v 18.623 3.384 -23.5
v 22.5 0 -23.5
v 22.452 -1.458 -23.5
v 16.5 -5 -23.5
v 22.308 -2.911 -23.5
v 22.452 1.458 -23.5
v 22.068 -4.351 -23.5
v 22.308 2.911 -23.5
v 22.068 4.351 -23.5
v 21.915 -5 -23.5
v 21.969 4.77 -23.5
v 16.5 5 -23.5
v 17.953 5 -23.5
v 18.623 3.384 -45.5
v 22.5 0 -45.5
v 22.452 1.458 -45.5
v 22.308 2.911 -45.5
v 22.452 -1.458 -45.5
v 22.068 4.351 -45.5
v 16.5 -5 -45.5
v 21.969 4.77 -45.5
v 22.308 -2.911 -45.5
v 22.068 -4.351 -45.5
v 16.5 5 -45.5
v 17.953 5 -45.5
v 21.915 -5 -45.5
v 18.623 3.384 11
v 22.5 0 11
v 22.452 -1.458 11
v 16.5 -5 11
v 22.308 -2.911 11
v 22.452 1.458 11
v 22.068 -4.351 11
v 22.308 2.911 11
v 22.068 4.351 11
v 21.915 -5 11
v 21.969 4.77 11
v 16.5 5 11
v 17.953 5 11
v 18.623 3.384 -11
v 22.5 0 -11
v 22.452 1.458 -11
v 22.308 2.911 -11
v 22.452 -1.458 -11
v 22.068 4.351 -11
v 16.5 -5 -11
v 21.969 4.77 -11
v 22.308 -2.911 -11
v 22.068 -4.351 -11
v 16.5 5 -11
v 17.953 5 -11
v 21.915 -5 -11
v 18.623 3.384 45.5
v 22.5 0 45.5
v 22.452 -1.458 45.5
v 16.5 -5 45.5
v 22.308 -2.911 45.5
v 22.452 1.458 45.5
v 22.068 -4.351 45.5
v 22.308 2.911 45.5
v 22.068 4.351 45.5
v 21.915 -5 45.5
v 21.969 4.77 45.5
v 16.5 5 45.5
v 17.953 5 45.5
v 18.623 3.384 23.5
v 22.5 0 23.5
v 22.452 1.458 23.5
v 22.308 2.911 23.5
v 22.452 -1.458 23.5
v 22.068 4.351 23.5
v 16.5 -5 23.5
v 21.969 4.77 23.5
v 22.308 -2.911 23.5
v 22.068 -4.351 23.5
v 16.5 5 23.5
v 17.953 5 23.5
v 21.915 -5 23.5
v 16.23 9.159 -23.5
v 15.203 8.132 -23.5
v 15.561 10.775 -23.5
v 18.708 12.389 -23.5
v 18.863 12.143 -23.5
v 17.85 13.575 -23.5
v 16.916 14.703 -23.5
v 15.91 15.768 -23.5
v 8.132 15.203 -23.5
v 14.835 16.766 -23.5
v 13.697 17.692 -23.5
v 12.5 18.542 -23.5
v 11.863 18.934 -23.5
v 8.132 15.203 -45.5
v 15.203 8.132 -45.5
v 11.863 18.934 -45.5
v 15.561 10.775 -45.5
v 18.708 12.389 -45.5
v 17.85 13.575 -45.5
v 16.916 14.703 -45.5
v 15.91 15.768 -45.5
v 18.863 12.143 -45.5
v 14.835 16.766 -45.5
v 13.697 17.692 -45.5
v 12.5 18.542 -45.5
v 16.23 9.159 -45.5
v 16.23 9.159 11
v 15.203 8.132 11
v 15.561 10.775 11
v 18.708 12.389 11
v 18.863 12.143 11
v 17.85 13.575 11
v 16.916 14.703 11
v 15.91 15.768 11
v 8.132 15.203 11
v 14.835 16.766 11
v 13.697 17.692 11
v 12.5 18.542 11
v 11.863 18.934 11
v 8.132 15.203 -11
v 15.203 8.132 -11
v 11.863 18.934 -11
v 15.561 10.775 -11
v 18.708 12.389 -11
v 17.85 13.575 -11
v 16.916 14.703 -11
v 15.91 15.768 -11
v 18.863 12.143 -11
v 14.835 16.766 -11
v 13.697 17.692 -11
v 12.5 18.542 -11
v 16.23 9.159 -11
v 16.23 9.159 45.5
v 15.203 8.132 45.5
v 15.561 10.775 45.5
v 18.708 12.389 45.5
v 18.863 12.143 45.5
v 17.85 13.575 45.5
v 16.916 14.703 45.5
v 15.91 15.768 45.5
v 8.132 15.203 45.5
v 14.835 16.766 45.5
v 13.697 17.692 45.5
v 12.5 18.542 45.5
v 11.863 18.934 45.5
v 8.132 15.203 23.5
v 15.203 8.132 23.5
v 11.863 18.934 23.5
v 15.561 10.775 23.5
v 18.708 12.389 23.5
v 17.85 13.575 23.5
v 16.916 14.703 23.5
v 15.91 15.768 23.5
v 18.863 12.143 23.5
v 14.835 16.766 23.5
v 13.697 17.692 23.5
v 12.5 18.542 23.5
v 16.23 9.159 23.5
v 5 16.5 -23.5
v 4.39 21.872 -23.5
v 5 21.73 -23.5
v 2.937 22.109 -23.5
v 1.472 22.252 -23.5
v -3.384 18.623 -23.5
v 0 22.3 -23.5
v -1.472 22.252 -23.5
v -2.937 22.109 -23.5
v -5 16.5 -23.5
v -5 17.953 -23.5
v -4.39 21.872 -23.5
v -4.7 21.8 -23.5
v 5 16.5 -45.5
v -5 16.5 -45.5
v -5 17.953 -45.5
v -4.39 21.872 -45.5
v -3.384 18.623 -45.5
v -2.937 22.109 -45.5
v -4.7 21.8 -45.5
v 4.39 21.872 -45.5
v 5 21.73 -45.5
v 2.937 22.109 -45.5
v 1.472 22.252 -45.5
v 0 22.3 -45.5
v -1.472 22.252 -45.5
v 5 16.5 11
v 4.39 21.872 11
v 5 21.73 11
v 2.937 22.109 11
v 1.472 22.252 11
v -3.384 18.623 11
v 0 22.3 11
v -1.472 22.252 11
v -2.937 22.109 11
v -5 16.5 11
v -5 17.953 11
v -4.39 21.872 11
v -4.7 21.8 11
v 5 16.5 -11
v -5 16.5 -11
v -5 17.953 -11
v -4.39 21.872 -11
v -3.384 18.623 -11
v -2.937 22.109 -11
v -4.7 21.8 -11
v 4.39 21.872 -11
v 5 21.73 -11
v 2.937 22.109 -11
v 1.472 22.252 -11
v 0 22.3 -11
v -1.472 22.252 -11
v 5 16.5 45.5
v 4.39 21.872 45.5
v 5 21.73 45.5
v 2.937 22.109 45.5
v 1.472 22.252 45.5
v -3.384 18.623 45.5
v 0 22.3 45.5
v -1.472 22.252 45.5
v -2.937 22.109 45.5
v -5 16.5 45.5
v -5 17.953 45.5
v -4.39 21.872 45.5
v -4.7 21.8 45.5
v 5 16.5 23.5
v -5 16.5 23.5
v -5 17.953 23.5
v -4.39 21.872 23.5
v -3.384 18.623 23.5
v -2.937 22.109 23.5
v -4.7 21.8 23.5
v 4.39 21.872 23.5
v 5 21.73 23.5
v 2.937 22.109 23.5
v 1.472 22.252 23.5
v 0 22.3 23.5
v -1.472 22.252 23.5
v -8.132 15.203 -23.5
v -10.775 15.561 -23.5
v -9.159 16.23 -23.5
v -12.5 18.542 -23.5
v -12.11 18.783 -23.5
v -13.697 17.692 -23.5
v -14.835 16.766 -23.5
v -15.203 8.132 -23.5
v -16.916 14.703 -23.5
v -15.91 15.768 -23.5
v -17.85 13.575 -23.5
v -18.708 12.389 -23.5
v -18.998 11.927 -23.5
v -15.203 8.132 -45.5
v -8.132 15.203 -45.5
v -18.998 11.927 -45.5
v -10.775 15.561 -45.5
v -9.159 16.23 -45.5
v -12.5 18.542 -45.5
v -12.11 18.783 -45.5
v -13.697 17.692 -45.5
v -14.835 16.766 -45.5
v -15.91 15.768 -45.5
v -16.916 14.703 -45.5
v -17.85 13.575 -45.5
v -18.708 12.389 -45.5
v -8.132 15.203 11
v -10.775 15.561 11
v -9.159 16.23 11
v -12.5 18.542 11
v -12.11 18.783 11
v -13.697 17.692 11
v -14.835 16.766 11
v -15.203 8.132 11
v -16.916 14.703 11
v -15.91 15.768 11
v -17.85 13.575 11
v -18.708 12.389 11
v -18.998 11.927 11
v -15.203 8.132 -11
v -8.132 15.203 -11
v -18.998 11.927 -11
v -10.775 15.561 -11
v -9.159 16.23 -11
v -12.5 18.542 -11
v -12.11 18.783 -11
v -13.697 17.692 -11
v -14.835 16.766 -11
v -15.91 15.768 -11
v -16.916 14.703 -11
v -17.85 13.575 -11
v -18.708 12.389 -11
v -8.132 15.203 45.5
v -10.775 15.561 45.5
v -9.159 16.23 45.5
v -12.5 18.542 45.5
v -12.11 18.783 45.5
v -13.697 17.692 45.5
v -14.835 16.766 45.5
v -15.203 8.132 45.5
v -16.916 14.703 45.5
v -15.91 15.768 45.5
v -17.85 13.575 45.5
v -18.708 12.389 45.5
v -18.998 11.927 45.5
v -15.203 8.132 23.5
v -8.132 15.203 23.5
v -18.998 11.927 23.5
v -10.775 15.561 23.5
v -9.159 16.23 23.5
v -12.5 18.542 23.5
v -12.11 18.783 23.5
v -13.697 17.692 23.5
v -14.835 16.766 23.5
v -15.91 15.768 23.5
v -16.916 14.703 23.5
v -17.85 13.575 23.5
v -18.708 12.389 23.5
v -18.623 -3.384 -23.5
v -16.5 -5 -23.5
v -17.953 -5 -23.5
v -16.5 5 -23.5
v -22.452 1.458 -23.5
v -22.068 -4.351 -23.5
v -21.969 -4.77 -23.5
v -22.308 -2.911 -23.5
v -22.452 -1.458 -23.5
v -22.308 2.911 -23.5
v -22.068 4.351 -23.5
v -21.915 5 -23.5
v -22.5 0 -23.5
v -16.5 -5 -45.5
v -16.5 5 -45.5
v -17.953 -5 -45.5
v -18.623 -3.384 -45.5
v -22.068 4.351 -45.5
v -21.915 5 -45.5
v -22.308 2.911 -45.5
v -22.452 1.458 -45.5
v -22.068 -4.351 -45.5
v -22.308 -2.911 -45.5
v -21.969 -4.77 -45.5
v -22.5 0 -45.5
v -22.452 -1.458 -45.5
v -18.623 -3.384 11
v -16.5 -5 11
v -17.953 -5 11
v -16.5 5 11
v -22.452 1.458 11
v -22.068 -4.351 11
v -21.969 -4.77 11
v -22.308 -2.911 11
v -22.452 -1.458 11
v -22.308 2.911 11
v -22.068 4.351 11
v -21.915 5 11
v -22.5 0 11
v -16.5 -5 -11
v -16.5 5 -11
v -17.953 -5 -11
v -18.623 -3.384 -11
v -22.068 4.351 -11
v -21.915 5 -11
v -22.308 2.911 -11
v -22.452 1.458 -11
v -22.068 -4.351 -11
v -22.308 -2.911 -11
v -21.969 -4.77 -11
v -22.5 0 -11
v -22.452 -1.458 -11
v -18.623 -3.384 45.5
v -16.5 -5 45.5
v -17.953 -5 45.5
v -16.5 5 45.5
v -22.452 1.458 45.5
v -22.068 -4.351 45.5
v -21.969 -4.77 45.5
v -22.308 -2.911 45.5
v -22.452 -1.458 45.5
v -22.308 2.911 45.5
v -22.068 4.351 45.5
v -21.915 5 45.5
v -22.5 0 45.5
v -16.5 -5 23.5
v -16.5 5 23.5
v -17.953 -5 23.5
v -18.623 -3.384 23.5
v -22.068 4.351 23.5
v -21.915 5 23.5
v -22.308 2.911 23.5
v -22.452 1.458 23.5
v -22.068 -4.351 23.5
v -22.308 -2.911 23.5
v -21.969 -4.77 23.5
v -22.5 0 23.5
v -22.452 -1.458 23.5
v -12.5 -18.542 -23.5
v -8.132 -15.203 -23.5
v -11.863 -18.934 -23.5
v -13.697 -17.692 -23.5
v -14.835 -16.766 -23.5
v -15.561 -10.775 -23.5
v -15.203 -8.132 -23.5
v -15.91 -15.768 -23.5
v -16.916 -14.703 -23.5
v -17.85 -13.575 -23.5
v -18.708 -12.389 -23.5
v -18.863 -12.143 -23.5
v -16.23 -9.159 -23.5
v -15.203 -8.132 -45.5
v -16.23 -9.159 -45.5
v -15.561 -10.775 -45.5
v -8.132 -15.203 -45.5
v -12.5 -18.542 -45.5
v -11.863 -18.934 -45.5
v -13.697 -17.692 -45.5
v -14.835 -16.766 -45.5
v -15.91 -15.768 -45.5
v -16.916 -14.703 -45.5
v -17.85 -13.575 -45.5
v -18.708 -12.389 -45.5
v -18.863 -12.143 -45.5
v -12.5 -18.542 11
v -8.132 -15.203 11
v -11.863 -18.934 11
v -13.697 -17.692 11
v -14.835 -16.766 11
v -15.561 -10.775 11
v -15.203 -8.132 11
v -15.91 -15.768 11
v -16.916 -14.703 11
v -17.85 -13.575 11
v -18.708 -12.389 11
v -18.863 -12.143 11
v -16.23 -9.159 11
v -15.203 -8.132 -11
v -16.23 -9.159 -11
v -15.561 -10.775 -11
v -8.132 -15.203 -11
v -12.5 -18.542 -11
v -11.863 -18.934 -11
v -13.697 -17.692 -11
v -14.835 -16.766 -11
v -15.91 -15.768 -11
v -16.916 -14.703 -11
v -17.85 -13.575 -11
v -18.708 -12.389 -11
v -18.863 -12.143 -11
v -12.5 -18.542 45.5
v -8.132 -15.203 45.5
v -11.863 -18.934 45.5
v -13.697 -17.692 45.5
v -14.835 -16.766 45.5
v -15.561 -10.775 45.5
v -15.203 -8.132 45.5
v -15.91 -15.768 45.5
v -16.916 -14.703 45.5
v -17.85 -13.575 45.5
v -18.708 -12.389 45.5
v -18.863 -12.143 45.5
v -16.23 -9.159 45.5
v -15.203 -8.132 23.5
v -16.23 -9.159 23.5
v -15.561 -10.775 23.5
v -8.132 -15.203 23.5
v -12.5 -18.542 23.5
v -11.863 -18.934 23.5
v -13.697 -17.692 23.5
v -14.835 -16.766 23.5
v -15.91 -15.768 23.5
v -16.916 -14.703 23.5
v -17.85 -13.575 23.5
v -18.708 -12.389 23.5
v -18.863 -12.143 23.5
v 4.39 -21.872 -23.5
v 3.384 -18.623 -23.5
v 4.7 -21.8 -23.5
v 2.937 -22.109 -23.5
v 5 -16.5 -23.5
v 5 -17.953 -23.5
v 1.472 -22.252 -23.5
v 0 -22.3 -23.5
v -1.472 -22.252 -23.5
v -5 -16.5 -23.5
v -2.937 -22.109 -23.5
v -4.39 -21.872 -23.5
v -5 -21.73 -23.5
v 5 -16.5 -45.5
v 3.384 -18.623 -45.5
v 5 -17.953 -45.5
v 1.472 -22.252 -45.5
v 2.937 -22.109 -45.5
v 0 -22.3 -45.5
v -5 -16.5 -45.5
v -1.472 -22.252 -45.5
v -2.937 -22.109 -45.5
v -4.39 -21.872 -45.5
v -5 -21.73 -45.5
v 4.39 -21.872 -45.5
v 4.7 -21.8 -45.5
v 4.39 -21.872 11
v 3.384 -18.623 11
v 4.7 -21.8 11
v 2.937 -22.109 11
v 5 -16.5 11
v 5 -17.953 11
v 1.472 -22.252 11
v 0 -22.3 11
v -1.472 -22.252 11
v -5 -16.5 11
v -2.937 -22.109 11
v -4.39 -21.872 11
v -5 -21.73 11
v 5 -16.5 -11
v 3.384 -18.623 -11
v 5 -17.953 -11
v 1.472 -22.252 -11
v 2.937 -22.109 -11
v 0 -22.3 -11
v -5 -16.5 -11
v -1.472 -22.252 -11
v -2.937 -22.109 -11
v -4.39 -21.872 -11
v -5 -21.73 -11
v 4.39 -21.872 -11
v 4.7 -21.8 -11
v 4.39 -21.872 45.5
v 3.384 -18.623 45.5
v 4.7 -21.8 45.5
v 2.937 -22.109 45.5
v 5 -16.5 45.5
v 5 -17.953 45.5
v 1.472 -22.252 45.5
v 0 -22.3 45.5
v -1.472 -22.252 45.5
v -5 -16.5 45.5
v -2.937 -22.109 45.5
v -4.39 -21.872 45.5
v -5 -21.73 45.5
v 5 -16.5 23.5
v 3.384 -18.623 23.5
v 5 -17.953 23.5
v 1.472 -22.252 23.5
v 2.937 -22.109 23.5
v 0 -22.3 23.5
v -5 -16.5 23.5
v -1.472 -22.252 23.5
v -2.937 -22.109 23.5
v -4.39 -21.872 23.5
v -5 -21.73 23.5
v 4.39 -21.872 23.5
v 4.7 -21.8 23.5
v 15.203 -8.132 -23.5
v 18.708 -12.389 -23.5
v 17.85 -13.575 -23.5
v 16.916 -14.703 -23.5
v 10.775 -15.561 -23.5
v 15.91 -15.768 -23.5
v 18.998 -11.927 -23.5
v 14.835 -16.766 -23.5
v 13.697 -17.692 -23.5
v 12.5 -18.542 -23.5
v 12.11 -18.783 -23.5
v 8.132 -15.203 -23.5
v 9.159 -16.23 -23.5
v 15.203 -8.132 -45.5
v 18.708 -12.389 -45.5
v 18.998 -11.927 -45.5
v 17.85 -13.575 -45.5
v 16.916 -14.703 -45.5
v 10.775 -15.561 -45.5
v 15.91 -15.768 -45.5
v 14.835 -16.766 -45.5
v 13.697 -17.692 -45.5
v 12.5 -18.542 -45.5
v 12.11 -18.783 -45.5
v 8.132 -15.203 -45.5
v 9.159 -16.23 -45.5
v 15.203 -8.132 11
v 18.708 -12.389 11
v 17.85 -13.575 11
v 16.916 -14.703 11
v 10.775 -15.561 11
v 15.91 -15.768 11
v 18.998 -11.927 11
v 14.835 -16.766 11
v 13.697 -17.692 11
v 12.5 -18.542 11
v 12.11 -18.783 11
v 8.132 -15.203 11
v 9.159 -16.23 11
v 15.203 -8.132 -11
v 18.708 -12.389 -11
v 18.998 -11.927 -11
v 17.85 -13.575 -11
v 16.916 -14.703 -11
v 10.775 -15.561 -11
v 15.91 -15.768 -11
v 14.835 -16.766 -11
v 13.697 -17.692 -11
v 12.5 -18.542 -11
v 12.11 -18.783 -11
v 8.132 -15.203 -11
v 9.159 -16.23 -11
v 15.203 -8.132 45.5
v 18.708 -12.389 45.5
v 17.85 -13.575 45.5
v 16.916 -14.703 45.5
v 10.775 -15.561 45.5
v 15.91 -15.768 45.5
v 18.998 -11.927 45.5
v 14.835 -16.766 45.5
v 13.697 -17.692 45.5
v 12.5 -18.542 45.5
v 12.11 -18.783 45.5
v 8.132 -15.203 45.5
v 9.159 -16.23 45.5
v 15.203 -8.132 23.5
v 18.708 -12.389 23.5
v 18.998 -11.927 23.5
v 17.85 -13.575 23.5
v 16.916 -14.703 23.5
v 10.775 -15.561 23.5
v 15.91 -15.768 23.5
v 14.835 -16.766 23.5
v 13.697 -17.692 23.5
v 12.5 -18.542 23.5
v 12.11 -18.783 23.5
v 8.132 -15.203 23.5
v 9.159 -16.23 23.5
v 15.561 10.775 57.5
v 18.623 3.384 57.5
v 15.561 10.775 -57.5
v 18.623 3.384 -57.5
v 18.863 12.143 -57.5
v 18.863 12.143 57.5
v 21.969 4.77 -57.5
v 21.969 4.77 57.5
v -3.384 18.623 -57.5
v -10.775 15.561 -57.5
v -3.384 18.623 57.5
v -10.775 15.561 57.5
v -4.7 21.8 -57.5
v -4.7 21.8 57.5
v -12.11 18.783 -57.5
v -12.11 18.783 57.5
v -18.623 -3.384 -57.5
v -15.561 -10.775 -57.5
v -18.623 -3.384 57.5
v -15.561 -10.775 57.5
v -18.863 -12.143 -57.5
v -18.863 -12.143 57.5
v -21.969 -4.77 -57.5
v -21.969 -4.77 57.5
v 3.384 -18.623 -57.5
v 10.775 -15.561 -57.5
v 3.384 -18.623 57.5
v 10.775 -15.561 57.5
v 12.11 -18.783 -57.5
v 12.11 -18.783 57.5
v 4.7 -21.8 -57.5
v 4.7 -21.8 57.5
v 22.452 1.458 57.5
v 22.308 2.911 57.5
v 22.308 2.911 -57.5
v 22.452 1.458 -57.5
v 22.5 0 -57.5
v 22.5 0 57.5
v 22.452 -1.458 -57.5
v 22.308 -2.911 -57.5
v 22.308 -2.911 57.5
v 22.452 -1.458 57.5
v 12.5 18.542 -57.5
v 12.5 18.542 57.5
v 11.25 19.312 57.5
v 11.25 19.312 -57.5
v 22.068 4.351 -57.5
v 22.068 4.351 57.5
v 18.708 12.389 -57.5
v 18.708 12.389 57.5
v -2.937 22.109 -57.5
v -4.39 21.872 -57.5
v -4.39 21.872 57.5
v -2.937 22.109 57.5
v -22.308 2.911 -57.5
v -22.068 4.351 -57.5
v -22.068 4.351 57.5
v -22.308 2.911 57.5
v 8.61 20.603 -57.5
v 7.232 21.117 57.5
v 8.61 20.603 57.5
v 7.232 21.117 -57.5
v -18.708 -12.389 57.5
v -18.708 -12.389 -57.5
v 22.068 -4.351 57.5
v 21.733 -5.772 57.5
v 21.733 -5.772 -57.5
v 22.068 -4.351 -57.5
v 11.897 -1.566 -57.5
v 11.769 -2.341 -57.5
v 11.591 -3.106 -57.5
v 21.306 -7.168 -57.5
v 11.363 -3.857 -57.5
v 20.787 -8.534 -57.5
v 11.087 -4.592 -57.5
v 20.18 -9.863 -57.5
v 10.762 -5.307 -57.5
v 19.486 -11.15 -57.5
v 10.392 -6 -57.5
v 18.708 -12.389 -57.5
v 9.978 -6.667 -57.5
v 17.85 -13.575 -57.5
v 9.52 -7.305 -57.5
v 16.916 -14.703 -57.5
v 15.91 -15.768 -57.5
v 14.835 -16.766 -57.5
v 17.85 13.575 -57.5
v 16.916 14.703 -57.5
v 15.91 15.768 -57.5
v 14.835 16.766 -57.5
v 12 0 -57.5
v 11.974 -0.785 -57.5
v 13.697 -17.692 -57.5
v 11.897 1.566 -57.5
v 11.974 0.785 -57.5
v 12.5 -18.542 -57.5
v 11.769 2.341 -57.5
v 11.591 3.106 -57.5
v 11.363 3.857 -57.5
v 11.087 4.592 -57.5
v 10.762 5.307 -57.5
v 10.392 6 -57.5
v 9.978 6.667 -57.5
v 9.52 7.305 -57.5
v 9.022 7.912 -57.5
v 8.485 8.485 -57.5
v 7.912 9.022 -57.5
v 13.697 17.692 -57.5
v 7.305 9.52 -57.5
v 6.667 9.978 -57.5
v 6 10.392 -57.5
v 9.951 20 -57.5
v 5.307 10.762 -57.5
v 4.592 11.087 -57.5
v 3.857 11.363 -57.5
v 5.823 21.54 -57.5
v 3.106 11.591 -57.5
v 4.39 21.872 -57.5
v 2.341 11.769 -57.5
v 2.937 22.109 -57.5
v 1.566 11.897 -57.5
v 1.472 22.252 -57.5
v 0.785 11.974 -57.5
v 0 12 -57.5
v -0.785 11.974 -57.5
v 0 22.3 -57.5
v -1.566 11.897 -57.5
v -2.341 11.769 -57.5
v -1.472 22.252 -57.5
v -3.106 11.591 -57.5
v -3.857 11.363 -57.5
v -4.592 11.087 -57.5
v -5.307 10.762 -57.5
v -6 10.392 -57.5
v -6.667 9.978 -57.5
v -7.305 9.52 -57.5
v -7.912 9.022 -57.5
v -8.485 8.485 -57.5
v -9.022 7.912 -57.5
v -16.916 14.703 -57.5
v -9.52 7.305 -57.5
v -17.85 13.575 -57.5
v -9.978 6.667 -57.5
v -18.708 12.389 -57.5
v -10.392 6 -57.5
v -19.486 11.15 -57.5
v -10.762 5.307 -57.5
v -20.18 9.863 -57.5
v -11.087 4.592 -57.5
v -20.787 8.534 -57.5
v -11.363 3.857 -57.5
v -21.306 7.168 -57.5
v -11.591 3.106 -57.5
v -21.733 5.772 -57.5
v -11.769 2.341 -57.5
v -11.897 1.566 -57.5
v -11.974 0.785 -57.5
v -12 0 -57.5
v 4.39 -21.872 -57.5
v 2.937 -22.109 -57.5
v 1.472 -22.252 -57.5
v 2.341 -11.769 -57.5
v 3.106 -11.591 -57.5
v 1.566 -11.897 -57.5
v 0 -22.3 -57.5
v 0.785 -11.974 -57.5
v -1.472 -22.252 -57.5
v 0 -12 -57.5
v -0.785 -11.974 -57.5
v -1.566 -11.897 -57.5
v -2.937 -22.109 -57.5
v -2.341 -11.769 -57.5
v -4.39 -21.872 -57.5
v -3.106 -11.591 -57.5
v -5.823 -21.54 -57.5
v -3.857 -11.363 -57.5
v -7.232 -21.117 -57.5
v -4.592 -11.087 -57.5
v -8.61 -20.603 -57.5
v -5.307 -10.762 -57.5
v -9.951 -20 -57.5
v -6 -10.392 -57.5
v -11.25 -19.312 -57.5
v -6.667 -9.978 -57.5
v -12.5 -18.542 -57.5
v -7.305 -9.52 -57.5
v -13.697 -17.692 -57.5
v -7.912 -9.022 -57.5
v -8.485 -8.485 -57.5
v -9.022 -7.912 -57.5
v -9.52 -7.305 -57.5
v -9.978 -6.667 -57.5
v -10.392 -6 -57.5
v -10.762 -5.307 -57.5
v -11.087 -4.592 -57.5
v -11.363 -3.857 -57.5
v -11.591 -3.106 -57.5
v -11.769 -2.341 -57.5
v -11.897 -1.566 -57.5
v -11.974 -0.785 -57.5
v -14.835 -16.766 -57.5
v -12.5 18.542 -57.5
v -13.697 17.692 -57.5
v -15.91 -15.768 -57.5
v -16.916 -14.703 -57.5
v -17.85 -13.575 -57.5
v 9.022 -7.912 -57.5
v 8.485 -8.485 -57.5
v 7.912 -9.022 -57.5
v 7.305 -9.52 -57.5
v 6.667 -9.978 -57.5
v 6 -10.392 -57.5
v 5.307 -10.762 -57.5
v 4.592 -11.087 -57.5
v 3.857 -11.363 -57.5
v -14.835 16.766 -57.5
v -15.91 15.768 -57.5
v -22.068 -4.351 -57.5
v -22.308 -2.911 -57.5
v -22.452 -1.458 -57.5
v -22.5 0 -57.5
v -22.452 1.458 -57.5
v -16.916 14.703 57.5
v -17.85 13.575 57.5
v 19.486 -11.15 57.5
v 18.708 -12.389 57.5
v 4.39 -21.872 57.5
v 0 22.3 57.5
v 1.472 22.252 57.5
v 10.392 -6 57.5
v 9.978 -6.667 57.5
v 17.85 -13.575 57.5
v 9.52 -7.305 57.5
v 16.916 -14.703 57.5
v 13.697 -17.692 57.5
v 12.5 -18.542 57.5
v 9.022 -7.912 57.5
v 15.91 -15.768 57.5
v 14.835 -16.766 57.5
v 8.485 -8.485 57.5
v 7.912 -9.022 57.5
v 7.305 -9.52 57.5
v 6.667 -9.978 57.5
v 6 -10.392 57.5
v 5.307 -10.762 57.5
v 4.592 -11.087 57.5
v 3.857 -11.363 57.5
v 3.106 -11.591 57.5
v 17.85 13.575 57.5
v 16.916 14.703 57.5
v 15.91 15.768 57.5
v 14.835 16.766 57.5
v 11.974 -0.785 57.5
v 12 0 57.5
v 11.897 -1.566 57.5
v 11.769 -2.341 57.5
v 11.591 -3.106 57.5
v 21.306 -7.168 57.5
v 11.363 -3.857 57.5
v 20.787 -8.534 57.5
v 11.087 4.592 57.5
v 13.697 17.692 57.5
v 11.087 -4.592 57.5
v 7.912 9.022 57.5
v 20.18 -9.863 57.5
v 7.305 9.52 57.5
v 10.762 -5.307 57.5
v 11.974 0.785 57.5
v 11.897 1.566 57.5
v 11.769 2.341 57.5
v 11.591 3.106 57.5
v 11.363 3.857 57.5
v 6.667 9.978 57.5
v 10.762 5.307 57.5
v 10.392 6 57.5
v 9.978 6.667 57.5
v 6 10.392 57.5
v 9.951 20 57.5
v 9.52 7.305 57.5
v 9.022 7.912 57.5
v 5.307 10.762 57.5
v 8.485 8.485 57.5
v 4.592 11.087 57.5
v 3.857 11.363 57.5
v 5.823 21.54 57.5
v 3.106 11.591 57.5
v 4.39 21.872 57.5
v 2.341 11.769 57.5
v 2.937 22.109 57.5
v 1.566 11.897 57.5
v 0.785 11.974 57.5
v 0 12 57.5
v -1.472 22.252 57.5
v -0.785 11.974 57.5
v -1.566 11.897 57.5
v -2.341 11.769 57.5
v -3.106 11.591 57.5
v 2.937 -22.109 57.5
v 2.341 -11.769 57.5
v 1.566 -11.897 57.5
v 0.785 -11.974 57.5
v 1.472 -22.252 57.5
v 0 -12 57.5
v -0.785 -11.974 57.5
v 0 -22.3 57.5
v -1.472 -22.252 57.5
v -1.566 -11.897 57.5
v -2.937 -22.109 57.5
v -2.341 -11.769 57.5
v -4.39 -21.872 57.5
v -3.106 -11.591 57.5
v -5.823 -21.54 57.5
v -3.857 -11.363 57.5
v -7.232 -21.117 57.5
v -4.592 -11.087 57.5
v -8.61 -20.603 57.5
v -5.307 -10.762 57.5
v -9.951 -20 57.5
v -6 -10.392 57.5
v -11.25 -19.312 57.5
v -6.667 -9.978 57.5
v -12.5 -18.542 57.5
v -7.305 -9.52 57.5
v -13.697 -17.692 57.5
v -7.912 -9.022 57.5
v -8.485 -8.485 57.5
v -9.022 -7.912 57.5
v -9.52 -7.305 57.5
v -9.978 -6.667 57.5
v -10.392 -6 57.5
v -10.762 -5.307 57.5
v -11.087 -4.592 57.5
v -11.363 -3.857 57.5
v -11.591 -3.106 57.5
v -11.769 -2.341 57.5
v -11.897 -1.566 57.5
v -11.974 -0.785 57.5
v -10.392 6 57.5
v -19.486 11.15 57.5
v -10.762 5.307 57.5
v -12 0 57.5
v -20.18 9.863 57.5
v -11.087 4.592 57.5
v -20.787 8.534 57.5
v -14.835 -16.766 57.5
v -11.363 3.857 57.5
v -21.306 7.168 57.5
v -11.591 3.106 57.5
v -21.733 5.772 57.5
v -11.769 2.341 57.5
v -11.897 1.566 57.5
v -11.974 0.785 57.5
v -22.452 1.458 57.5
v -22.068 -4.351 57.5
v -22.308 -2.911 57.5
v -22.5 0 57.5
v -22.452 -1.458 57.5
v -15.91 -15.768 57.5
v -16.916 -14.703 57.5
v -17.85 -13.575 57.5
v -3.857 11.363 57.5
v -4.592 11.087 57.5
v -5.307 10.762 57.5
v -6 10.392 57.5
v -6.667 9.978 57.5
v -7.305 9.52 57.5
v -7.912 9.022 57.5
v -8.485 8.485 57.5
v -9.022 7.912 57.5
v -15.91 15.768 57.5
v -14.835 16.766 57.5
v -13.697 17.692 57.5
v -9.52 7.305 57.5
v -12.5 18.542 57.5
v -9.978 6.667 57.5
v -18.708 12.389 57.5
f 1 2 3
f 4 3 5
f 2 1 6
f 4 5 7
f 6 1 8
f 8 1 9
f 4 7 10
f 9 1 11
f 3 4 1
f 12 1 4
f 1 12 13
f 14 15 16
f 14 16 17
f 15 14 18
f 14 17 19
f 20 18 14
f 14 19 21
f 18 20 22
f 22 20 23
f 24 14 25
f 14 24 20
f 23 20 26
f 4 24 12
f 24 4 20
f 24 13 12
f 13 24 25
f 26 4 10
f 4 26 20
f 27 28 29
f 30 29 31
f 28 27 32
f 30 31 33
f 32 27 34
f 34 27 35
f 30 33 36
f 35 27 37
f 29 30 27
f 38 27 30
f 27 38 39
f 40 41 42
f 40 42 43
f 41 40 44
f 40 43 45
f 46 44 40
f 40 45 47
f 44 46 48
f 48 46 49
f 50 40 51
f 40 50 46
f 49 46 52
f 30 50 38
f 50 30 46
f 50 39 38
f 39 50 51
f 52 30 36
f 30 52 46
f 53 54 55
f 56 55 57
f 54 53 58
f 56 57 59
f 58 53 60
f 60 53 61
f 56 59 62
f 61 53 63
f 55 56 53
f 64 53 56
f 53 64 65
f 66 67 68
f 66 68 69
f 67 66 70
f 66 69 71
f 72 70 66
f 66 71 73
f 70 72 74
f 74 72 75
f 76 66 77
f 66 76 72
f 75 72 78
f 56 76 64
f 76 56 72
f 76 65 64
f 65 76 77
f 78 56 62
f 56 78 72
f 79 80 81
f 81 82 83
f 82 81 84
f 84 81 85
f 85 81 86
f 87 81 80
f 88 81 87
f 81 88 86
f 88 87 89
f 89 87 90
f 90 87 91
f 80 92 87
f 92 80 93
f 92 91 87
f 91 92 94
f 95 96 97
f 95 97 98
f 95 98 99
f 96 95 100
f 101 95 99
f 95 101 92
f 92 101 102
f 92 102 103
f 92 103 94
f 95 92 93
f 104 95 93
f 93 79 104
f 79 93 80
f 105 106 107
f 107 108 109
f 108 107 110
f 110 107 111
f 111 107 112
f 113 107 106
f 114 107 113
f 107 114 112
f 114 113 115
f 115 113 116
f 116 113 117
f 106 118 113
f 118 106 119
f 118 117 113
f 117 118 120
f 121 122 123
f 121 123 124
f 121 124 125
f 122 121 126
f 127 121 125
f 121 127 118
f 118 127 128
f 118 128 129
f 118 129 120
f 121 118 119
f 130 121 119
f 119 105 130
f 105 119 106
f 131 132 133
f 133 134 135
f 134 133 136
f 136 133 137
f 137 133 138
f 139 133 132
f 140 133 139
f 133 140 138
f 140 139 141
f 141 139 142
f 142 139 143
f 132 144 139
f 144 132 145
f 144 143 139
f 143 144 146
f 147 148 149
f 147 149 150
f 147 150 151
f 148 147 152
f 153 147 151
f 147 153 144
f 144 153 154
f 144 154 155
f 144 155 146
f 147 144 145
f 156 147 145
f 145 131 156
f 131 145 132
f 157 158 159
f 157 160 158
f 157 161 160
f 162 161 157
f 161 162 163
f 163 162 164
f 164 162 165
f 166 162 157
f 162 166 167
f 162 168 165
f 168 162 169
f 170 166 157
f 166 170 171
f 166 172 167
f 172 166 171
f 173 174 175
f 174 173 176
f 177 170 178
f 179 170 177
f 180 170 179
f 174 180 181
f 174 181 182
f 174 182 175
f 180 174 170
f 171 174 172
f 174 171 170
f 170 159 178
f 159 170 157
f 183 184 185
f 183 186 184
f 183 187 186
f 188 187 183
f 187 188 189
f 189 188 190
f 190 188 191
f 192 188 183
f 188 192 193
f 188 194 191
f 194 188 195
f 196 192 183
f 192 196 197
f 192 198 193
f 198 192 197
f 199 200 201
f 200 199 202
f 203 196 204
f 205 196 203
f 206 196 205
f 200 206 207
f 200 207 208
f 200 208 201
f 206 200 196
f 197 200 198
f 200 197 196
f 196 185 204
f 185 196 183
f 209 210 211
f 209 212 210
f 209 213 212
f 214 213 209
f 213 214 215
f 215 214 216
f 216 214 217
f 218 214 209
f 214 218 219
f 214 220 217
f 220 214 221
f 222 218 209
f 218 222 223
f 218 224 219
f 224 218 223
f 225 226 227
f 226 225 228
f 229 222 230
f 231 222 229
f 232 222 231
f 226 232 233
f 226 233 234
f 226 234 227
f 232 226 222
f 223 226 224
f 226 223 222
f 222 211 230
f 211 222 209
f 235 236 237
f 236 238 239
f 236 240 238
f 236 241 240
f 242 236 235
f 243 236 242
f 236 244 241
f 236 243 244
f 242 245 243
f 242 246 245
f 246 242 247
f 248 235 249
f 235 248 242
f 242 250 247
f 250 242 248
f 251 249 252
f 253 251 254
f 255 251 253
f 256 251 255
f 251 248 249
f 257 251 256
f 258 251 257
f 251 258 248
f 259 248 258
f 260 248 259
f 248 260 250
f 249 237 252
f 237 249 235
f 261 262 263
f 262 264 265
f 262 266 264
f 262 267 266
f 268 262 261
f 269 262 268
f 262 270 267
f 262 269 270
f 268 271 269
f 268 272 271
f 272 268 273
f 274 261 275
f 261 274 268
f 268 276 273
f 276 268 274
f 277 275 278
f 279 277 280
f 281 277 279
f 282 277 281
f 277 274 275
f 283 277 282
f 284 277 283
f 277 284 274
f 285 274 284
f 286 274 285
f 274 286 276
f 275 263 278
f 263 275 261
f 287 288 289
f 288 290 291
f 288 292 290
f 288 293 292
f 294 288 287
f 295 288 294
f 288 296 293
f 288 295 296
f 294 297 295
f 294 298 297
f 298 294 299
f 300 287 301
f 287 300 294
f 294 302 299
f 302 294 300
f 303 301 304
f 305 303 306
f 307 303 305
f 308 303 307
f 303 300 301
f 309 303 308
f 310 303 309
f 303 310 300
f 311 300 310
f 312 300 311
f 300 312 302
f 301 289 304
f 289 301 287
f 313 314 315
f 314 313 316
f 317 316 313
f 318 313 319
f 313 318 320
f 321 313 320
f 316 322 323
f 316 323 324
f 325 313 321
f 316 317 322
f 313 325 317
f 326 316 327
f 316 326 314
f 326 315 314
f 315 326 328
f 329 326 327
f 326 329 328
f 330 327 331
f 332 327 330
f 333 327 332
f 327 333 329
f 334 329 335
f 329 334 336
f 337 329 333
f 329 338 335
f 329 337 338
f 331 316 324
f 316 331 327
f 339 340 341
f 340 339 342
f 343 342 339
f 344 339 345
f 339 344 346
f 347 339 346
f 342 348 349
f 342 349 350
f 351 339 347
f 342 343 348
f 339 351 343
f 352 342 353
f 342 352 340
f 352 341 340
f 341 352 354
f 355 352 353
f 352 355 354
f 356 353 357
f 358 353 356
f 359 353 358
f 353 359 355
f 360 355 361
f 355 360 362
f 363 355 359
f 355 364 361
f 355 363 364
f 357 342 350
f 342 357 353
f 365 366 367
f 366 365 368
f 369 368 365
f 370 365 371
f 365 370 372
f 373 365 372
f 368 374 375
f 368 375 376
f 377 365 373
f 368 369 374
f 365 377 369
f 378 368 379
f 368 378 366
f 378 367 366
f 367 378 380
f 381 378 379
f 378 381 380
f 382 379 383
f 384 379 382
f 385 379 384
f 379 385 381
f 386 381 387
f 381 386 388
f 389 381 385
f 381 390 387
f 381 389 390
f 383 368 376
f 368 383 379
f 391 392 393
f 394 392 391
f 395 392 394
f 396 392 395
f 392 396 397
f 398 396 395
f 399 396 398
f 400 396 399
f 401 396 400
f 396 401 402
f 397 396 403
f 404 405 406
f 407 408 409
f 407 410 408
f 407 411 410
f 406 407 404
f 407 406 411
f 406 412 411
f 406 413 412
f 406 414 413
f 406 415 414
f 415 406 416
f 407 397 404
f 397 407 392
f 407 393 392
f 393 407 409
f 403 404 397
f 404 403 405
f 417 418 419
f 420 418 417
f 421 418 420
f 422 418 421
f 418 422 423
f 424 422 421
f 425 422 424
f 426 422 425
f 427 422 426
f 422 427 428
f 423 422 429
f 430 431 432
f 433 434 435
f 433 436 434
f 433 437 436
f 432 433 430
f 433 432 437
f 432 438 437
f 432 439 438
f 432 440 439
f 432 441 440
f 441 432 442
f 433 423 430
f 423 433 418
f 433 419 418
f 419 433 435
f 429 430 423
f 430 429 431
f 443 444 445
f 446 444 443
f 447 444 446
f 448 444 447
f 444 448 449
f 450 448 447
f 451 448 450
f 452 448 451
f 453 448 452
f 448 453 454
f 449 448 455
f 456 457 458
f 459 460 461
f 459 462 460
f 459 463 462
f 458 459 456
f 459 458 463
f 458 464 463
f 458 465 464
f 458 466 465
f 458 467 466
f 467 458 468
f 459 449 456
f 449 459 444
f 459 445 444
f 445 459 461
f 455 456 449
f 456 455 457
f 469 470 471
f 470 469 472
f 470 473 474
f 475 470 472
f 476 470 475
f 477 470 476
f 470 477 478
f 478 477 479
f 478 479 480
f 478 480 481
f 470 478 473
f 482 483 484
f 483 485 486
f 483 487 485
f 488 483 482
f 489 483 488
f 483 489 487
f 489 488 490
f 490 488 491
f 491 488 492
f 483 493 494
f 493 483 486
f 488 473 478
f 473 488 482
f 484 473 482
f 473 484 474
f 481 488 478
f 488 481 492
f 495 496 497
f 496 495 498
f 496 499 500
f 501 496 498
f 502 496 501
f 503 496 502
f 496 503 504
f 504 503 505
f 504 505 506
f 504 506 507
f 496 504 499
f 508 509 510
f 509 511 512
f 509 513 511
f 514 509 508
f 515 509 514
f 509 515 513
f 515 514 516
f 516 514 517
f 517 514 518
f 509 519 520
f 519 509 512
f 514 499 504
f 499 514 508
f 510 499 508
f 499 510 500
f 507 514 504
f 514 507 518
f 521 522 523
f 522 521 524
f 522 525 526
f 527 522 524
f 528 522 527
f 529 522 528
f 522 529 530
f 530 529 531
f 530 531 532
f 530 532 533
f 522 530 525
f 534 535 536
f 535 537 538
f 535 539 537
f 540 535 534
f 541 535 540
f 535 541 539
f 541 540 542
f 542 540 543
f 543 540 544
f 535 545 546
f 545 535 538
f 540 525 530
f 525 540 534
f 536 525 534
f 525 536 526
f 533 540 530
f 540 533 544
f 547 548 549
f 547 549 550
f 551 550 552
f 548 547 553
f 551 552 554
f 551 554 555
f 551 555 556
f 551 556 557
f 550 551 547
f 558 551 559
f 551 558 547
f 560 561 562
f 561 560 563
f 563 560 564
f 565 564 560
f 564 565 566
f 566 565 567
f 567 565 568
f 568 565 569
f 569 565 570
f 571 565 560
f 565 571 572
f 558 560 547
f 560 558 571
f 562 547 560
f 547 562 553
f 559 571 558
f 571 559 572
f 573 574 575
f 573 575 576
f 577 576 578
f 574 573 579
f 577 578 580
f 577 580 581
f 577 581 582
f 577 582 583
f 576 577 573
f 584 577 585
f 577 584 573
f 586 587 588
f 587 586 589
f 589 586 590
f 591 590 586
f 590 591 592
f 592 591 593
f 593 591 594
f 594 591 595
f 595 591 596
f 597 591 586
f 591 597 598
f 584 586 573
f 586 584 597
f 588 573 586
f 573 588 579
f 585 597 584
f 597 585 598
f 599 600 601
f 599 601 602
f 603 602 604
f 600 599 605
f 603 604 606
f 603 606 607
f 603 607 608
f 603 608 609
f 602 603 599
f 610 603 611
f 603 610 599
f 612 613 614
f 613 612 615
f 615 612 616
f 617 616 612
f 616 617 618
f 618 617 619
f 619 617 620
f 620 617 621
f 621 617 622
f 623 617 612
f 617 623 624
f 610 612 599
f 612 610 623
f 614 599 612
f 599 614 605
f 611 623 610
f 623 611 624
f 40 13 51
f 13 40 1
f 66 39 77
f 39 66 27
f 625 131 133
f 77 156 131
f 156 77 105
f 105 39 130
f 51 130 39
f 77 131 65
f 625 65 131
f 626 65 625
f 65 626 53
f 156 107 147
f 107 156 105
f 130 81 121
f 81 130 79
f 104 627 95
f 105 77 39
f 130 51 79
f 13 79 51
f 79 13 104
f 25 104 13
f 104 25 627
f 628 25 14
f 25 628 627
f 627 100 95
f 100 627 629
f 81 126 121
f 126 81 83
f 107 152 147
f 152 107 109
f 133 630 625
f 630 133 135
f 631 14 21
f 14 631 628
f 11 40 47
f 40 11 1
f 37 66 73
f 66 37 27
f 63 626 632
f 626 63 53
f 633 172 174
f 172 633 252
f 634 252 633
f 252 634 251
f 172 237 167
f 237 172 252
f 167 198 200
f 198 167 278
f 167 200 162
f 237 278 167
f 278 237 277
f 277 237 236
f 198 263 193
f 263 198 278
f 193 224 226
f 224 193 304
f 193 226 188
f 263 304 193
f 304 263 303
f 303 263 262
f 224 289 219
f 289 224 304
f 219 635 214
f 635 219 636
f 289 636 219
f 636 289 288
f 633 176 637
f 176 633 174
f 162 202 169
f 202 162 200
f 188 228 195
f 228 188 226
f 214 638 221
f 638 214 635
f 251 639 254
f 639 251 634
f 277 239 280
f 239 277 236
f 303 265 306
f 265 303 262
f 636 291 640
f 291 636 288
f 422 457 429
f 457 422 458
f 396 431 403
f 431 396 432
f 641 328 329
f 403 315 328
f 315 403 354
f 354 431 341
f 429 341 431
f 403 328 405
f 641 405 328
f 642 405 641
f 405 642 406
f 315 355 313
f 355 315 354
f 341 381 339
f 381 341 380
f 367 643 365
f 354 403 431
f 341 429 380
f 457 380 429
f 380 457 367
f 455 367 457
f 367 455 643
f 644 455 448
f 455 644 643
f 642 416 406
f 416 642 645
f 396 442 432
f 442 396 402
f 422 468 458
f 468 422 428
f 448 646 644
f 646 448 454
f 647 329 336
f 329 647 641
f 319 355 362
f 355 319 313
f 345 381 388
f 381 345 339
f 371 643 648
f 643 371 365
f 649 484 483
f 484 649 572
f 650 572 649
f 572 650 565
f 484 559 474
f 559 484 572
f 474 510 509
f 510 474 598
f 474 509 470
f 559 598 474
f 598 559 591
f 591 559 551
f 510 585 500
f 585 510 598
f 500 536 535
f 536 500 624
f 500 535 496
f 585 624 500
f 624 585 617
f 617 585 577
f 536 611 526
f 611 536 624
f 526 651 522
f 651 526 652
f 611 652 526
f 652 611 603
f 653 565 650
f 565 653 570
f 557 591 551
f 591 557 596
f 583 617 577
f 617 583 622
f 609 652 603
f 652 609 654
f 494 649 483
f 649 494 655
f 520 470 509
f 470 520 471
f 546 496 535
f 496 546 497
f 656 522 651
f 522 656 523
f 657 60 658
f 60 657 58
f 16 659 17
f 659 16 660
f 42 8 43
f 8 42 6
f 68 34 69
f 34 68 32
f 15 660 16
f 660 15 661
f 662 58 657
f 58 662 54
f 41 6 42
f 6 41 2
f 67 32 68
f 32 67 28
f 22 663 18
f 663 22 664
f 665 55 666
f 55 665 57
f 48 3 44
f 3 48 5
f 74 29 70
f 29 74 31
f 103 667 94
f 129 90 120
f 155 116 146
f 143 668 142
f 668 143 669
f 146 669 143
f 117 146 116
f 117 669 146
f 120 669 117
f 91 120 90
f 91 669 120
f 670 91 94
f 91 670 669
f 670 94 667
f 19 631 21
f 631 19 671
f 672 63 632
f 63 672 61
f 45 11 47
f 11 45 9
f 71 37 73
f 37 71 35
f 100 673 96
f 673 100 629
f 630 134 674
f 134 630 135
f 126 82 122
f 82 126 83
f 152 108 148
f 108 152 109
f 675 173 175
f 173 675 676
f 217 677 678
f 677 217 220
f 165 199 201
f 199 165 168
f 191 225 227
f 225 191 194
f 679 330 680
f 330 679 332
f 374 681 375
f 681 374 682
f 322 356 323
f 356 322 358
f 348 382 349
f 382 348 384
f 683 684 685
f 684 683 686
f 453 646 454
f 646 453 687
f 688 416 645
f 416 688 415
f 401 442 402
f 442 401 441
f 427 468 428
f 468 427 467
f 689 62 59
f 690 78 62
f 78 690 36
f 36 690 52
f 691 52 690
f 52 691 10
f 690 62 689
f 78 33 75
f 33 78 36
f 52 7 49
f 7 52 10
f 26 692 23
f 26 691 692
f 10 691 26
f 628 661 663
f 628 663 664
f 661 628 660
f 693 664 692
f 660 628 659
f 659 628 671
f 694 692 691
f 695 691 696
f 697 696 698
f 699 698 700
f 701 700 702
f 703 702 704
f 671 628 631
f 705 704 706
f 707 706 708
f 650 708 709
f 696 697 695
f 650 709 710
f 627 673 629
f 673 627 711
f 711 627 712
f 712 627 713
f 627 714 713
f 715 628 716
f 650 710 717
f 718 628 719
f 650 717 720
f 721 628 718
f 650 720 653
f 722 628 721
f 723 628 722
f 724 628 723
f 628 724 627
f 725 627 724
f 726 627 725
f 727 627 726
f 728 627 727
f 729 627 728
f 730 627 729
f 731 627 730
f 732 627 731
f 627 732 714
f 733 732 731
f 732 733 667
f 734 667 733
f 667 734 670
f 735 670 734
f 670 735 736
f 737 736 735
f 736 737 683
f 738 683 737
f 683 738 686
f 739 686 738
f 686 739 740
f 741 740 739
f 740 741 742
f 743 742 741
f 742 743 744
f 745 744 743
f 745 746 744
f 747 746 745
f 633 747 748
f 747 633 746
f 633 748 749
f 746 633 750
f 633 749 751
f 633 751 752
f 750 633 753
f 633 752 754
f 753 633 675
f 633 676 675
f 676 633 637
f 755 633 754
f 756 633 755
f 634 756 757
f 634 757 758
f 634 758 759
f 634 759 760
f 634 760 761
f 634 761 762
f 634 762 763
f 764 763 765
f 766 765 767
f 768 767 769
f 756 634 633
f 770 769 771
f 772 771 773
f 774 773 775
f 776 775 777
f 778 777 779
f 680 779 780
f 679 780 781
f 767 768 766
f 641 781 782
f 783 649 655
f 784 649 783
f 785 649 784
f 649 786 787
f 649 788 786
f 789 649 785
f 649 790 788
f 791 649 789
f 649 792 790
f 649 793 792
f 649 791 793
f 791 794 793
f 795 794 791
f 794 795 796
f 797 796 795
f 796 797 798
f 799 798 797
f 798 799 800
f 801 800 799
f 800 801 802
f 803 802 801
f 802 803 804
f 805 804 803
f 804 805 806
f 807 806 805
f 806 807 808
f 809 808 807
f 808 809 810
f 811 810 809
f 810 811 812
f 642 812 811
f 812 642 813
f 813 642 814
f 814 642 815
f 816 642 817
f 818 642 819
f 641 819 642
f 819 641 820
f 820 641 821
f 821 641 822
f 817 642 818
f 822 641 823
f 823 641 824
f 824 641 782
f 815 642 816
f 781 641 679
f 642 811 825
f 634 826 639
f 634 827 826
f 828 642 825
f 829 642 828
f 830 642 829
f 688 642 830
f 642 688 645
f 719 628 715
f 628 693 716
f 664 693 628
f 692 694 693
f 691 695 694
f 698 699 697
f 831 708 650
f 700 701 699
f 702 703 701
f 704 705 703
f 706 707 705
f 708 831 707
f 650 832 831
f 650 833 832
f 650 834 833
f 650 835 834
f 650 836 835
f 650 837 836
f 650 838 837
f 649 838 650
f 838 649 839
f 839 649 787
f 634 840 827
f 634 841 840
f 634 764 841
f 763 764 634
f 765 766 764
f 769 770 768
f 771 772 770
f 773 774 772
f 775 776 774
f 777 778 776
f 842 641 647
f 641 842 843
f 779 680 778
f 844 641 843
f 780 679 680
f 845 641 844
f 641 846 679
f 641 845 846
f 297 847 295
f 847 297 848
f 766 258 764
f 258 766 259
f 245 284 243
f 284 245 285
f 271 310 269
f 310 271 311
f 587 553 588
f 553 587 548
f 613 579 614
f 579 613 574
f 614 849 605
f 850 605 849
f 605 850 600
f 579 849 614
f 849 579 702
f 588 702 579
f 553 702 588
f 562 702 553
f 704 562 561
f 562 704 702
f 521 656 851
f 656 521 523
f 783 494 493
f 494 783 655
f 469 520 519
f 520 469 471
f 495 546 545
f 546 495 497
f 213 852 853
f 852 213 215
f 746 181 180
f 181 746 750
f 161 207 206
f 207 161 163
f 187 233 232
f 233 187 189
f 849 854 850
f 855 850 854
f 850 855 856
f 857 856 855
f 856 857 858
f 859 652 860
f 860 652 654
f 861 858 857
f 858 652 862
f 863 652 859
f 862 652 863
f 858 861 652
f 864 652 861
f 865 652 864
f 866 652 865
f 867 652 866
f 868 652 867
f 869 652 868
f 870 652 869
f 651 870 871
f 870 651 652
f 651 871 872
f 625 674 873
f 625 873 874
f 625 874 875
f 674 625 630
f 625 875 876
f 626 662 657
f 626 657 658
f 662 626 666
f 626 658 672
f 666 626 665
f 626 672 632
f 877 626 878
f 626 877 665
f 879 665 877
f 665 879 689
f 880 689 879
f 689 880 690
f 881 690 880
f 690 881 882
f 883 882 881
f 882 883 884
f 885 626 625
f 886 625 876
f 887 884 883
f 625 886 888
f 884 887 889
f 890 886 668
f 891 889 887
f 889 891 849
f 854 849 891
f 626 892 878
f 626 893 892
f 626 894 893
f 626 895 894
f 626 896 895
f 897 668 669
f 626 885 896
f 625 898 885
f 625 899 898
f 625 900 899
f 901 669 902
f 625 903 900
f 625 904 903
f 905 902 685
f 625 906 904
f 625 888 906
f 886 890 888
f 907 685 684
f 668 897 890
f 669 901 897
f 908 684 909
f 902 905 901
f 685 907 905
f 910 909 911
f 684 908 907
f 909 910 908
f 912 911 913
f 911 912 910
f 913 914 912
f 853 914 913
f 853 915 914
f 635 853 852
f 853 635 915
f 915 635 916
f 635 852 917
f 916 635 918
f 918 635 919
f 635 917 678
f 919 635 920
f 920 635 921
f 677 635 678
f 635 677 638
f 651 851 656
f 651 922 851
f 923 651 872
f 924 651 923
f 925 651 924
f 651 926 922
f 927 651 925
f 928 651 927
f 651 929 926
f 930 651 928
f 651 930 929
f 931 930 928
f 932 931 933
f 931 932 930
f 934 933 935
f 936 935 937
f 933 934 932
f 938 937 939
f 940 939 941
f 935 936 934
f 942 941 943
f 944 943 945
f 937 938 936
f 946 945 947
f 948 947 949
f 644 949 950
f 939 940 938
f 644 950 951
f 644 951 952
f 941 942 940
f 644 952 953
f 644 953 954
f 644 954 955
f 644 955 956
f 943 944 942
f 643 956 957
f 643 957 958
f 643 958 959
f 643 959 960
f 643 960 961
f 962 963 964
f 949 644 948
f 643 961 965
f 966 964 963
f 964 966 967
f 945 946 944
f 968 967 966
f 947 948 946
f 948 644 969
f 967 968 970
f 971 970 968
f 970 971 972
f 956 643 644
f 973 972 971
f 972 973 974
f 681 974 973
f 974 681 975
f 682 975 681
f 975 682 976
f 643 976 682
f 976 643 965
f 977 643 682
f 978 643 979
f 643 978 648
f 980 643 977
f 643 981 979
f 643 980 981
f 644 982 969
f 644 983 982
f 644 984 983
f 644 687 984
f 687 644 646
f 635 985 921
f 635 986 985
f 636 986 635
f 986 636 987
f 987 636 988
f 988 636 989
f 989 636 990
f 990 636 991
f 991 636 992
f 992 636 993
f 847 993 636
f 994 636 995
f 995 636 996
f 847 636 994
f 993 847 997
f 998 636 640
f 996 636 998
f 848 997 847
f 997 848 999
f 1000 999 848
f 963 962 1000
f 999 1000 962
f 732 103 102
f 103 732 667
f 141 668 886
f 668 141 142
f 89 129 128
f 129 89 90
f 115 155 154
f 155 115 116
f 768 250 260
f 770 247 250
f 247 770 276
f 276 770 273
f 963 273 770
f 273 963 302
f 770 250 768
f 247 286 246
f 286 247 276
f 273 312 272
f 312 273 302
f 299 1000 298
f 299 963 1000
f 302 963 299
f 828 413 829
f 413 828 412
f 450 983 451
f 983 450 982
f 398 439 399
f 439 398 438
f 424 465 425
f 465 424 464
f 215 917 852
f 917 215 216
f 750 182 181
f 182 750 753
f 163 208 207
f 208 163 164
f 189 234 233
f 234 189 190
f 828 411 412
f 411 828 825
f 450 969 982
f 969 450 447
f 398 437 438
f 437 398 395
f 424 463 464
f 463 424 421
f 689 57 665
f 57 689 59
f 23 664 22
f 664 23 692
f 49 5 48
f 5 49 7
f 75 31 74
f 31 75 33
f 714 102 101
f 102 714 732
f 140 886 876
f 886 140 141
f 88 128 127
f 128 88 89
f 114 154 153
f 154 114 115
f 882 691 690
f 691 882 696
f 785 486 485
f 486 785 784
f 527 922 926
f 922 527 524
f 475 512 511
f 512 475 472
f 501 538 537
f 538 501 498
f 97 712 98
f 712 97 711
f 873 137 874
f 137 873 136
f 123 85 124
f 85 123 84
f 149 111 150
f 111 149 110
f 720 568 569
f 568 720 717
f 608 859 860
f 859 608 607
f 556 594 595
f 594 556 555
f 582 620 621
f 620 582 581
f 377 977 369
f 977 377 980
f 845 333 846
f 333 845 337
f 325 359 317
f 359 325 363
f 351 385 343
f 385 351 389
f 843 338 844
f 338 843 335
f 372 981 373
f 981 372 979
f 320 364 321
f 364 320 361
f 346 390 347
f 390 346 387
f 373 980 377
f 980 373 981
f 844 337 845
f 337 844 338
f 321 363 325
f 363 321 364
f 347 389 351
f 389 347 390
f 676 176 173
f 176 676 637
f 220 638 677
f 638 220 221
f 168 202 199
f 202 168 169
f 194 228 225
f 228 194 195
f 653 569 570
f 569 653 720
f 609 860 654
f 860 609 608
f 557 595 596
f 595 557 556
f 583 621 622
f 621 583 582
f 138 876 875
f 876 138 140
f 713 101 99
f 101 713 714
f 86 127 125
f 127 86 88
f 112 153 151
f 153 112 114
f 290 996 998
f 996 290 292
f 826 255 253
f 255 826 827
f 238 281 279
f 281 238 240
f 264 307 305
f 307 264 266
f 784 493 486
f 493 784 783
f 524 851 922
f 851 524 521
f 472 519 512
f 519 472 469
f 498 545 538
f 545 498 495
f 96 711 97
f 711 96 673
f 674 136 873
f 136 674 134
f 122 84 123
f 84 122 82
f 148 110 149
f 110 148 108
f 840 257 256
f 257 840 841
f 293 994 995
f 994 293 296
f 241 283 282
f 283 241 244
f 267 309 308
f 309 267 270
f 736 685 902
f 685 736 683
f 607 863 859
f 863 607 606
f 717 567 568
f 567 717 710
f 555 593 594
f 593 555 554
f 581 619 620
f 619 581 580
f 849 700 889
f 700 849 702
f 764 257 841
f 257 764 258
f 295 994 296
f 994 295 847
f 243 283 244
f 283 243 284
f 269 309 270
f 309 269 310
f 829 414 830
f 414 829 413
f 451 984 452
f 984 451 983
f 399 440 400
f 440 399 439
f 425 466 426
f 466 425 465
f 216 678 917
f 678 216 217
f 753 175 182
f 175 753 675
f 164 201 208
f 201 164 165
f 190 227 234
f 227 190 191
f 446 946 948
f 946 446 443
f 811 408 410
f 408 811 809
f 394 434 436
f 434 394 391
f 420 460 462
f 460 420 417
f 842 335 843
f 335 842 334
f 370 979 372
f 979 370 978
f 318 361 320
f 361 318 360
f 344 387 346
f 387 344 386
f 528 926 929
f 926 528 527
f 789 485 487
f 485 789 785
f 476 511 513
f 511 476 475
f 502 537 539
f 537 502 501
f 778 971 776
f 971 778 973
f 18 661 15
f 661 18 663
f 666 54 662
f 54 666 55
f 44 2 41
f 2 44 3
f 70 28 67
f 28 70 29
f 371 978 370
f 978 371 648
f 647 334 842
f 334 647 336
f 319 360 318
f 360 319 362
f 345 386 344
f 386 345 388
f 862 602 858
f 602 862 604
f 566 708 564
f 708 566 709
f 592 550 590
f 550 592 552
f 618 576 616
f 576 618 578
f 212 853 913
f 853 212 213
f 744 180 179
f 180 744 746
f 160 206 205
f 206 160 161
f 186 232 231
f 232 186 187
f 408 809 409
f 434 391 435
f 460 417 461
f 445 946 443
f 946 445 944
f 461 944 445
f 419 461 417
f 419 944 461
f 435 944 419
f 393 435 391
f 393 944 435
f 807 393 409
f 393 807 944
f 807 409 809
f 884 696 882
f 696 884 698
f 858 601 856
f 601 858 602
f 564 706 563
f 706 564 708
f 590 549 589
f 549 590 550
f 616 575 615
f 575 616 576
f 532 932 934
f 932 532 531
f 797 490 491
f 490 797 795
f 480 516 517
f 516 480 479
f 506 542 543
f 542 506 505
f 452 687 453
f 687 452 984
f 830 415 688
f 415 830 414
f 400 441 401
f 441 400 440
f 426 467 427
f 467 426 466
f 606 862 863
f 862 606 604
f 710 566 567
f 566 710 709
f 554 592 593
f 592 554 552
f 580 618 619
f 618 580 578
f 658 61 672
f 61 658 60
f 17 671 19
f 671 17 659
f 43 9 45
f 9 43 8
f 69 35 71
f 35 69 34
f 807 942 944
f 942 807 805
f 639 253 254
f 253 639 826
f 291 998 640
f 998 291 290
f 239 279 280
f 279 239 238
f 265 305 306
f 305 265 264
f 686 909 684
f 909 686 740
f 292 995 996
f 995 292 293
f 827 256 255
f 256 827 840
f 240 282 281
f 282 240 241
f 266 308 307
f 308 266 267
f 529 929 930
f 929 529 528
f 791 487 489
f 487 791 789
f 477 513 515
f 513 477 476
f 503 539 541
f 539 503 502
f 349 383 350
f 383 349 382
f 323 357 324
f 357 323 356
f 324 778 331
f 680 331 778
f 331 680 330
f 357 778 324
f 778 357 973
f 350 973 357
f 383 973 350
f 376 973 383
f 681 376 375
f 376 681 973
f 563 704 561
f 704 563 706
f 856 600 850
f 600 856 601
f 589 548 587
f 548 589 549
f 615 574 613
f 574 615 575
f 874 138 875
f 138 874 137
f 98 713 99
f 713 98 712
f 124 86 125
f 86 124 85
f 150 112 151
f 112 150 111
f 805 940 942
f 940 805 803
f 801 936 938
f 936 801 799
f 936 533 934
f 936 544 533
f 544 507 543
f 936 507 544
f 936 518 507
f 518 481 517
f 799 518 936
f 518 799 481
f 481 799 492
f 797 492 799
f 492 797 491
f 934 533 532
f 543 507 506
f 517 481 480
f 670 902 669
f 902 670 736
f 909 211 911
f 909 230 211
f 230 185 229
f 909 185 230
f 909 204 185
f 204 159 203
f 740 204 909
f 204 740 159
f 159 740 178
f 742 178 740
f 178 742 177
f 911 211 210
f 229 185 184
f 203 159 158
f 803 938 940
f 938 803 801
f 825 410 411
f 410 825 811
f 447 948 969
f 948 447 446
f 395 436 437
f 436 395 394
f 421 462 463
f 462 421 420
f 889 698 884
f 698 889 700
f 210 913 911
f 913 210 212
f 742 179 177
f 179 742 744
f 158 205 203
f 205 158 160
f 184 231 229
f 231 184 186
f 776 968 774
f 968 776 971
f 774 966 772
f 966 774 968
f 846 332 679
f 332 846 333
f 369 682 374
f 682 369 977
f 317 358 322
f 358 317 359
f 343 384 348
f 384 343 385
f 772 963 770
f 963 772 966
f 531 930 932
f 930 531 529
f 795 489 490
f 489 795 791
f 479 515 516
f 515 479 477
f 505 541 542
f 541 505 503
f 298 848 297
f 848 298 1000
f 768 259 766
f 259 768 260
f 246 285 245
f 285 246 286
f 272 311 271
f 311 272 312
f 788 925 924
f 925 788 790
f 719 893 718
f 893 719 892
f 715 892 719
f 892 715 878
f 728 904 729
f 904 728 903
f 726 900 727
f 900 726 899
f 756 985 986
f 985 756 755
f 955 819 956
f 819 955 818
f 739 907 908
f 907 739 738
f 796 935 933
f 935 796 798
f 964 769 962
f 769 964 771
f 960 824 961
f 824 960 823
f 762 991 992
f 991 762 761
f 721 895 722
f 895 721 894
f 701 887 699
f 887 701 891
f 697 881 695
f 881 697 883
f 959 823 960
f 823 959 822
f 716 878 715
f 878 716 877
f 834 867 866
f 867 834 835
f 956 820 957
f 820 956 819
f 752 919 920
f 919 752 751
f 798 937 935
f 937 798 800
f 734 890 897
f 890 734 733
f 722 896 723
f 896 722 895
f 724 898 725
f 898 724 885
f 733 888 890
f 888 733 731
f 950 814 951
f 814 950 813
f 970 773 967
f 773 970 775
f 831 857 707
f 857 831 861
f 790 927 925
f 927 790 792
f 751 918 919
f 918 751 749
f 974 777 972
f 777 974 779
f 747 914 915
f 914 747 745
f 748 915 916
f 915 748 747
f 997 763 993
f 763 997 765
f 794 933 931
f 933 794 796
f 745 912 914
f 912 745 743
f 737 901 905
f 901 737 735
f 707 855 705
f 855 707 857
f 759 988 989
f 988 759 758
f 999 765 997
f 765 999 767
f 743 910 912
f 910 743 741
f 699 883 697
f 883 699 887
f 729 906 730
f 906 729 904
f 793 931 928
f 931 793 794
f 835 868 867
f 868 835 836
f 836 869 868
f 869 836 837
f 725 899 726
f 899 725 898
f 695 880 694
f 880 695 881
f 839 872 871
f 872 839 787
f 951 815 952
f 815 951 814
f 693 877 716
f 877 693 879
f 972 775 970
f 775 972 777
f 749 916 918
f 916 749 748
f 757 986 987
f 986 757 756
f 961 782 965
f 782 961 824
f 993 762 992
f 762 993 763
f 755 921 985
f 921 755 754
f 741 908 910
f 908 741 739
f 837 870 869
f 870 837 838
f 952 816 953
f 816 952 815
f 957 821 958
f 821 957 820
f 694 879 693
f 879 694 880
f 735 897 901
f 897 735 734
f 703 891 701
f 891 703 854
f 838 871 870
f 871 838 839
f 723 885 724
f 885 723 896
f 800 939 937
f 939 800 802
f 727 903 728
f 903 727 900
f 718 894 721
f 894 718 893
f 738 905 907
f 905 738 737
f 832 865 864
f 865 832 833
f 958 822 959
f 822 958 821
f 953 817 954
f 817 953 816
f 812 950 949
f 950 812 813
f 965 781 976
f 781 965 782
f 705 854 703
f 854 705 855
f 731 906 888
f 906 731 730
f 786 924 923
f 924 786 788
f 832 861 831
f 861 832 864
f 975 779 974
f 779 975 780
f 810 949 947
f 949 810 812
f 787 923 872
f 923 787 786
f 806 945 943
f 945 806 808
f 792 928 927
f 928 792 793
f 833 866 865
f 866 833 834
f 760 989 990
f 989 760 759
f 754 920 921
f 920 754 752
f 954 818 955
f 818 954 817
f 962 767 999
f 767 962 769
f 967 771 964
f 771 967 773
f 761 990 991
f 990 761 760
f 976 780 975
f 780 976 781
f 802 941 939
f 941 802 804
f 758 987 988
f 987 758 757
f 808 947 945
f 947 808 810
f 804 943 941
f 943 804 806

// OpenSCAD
$fn=96;

outer_d = 45.0;
outer_d_y = 44.6;
h = 115.0;

bore_d = 24.0;

notch_count = 8;
notch_depth = 6.0;
notch_width = 10.0;
notch_height = 22.0;

key_count = 4;
key_depth = 4.0;
key_width = 8.0;
key_height = 115.0;

module outer_shell() {
    scale([1, outer_d_y/outer_d, 1])
        cylinder(d=outer_d, h=h, center=true);
}

module bore() {
    cylinder(d=bore_d, h=h+2, center=true);
}

module radial_notch(angle_deg, zpos) {
    rotate([0,0,angle_deg])
        translate([outer_d/2 - notch_depth/2, 0, zpos])
            cube([notch_depth, notch_width, notch_height], center=true);
}

module full_height_key(angle_deg) {
    rotate([0,0,angle_deg])
        translate([outer_d/2 - key_depth/2, 0, 0])
            cube([key_depth, key_width, key_height+2], center=true);
}

module notch_set() {
    for (i = [0:notch_count-1]) {
        a = i*360/notch_count;
        radial_notch(a, -h*0.30);
        radial_notch(a, 0);
        radial_notch(a, h*0.30);
    }
}

module key_set() {
    for (i = [0:key_count-1]) {
        a = i*360/key_count + 22.5;
        full_height_key(a);
    }
}

difference() {
    outer_shell();
    bore();
    notch_set();
    key_set();
}
